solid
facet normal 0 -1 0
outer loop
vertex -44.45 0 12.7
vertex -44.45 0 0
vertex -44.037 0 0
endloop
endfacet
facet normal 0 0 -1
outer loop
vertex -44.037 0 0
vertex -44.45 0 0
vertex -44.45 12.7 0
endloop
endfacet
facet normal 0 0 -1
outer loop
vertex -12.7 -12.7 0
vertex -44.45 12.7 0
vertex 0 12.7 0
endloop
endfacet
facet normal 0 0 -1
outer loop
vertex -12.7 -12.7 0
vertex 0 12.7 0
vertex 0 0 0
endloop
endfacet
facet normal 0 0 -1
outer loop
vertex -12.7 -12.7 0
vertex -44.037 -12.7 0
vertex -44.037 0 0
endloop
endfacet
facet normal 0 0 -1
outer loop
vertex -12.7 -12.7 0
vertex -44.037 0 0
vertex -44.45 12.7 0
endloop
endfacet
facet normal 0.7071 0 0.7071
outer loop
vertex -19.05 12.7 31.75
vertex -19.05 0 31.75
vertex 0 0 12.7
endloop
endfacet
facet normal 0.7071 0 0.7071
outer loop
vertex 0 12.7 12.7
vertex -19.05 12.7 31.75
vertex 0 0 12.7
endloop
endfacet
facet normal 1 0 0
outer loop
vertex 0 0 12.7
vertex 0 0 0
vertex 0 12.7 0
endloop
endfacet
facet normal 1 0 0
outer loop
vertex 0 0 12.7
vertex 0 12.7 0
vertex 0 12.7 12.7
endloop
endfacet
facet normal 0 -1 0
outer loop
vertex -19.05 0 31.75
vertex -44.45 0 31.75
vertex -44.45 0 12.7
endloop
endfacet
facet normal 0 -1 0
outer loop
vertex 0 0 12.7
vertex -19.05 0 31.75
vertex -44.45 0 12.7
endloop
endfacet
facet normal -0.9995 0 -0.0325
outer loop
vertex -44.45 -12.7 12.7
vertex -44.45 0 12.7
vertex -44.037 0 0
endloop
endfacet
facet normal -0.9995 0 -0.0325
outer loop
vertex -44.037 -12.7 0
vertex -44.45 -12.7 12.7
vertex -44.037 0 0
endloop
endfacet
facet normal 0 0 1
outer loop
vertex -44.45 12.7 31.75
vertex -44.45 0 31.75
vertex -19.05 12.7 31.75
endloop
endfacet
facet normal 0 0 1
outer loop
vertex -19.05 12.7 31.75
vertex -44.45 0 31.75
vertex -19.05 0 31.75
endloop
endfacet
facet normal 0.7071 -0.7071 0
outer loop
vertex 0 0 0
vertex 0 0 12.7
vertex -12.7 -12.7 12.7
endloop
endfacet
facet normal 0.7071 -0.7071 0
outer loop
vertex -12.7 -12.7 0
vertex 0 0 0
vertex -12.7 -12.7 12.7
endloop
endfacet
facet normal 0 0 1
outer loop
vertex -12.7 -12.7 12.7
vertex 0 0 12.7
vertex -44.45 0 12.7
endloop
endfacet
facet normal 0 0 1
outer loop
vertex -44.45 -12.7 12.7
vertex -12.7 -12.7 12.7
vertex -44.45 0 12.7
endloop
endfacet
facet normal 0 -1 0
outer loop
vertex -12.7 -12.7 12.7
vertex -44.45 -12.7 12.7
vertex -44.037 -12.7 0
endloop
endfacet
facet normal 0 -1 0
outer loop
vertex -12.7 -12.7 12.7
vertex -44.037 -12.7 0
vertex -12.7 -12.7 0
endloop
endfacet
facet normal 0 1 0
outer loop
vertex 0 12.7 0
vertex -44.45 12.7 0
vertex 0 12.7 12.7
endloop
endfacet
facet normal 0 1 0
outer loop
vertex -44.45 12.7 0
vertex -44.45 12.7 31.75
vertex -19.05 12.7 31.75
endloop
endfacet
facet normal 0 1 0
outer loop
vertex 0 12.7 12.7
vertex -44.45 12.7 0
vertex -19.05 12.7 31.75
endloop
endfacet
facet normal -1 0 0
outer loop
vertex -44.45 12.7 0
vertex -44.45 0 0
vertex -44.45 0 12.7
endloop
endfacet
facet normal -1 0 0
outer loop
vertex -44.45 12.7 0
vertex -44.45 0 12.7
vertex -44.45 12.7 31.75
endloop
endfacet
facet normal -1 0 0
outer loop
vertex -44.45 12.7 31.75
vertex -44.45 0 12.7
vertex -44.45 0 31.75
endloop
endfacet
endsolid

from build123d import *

# Parameters (mm, degrees)
F2_DEPTH = 12.7
F0_W     = 44.45
F0_H     = 31.75
F3_DEPTH = 12.7
F5_DEPTH = 25.4
F7_DEPTH = 25.4


with BuildPart() as f2:
    # F1 (on face) → F2 (new body)
    with BuildSketch(Plane.XZ):
        Polygon((0, 12.7), (-44.45, 12.7), (-44.037469, 0), (0, 0), align=None)
    extrude(amount=F2_DEPTH)

    # F0 (on Front) → F3 (join)
    with BuildSketch(Plane.XZ):
        with Locations((-22.225, 15.875)):
            Rectangle(F0_W, F0_H)
    extrude(amount=-F3_DEPTH)

    # F4 (on face) → F5 (cut)
    with BuildSketch(Plane.XZ):
        Polygon((0, 31.75), (-19.05, 31.75), (0, 12.7), align=None)
    extrude(amount=-F5_DEPTH, mode=Mode.SUBTRACT)

    # F6 (on face) → F7 (cut)
    with BuildSketch(Plane.XY.offset(12.7)):
        Polygon((0, 0), (-12.7, -12.7), (0, -12.7), align=None)
    extrude(amount=-F7_DEPTH, mode=Mode.SUBTRACT)


solid = f2.part
